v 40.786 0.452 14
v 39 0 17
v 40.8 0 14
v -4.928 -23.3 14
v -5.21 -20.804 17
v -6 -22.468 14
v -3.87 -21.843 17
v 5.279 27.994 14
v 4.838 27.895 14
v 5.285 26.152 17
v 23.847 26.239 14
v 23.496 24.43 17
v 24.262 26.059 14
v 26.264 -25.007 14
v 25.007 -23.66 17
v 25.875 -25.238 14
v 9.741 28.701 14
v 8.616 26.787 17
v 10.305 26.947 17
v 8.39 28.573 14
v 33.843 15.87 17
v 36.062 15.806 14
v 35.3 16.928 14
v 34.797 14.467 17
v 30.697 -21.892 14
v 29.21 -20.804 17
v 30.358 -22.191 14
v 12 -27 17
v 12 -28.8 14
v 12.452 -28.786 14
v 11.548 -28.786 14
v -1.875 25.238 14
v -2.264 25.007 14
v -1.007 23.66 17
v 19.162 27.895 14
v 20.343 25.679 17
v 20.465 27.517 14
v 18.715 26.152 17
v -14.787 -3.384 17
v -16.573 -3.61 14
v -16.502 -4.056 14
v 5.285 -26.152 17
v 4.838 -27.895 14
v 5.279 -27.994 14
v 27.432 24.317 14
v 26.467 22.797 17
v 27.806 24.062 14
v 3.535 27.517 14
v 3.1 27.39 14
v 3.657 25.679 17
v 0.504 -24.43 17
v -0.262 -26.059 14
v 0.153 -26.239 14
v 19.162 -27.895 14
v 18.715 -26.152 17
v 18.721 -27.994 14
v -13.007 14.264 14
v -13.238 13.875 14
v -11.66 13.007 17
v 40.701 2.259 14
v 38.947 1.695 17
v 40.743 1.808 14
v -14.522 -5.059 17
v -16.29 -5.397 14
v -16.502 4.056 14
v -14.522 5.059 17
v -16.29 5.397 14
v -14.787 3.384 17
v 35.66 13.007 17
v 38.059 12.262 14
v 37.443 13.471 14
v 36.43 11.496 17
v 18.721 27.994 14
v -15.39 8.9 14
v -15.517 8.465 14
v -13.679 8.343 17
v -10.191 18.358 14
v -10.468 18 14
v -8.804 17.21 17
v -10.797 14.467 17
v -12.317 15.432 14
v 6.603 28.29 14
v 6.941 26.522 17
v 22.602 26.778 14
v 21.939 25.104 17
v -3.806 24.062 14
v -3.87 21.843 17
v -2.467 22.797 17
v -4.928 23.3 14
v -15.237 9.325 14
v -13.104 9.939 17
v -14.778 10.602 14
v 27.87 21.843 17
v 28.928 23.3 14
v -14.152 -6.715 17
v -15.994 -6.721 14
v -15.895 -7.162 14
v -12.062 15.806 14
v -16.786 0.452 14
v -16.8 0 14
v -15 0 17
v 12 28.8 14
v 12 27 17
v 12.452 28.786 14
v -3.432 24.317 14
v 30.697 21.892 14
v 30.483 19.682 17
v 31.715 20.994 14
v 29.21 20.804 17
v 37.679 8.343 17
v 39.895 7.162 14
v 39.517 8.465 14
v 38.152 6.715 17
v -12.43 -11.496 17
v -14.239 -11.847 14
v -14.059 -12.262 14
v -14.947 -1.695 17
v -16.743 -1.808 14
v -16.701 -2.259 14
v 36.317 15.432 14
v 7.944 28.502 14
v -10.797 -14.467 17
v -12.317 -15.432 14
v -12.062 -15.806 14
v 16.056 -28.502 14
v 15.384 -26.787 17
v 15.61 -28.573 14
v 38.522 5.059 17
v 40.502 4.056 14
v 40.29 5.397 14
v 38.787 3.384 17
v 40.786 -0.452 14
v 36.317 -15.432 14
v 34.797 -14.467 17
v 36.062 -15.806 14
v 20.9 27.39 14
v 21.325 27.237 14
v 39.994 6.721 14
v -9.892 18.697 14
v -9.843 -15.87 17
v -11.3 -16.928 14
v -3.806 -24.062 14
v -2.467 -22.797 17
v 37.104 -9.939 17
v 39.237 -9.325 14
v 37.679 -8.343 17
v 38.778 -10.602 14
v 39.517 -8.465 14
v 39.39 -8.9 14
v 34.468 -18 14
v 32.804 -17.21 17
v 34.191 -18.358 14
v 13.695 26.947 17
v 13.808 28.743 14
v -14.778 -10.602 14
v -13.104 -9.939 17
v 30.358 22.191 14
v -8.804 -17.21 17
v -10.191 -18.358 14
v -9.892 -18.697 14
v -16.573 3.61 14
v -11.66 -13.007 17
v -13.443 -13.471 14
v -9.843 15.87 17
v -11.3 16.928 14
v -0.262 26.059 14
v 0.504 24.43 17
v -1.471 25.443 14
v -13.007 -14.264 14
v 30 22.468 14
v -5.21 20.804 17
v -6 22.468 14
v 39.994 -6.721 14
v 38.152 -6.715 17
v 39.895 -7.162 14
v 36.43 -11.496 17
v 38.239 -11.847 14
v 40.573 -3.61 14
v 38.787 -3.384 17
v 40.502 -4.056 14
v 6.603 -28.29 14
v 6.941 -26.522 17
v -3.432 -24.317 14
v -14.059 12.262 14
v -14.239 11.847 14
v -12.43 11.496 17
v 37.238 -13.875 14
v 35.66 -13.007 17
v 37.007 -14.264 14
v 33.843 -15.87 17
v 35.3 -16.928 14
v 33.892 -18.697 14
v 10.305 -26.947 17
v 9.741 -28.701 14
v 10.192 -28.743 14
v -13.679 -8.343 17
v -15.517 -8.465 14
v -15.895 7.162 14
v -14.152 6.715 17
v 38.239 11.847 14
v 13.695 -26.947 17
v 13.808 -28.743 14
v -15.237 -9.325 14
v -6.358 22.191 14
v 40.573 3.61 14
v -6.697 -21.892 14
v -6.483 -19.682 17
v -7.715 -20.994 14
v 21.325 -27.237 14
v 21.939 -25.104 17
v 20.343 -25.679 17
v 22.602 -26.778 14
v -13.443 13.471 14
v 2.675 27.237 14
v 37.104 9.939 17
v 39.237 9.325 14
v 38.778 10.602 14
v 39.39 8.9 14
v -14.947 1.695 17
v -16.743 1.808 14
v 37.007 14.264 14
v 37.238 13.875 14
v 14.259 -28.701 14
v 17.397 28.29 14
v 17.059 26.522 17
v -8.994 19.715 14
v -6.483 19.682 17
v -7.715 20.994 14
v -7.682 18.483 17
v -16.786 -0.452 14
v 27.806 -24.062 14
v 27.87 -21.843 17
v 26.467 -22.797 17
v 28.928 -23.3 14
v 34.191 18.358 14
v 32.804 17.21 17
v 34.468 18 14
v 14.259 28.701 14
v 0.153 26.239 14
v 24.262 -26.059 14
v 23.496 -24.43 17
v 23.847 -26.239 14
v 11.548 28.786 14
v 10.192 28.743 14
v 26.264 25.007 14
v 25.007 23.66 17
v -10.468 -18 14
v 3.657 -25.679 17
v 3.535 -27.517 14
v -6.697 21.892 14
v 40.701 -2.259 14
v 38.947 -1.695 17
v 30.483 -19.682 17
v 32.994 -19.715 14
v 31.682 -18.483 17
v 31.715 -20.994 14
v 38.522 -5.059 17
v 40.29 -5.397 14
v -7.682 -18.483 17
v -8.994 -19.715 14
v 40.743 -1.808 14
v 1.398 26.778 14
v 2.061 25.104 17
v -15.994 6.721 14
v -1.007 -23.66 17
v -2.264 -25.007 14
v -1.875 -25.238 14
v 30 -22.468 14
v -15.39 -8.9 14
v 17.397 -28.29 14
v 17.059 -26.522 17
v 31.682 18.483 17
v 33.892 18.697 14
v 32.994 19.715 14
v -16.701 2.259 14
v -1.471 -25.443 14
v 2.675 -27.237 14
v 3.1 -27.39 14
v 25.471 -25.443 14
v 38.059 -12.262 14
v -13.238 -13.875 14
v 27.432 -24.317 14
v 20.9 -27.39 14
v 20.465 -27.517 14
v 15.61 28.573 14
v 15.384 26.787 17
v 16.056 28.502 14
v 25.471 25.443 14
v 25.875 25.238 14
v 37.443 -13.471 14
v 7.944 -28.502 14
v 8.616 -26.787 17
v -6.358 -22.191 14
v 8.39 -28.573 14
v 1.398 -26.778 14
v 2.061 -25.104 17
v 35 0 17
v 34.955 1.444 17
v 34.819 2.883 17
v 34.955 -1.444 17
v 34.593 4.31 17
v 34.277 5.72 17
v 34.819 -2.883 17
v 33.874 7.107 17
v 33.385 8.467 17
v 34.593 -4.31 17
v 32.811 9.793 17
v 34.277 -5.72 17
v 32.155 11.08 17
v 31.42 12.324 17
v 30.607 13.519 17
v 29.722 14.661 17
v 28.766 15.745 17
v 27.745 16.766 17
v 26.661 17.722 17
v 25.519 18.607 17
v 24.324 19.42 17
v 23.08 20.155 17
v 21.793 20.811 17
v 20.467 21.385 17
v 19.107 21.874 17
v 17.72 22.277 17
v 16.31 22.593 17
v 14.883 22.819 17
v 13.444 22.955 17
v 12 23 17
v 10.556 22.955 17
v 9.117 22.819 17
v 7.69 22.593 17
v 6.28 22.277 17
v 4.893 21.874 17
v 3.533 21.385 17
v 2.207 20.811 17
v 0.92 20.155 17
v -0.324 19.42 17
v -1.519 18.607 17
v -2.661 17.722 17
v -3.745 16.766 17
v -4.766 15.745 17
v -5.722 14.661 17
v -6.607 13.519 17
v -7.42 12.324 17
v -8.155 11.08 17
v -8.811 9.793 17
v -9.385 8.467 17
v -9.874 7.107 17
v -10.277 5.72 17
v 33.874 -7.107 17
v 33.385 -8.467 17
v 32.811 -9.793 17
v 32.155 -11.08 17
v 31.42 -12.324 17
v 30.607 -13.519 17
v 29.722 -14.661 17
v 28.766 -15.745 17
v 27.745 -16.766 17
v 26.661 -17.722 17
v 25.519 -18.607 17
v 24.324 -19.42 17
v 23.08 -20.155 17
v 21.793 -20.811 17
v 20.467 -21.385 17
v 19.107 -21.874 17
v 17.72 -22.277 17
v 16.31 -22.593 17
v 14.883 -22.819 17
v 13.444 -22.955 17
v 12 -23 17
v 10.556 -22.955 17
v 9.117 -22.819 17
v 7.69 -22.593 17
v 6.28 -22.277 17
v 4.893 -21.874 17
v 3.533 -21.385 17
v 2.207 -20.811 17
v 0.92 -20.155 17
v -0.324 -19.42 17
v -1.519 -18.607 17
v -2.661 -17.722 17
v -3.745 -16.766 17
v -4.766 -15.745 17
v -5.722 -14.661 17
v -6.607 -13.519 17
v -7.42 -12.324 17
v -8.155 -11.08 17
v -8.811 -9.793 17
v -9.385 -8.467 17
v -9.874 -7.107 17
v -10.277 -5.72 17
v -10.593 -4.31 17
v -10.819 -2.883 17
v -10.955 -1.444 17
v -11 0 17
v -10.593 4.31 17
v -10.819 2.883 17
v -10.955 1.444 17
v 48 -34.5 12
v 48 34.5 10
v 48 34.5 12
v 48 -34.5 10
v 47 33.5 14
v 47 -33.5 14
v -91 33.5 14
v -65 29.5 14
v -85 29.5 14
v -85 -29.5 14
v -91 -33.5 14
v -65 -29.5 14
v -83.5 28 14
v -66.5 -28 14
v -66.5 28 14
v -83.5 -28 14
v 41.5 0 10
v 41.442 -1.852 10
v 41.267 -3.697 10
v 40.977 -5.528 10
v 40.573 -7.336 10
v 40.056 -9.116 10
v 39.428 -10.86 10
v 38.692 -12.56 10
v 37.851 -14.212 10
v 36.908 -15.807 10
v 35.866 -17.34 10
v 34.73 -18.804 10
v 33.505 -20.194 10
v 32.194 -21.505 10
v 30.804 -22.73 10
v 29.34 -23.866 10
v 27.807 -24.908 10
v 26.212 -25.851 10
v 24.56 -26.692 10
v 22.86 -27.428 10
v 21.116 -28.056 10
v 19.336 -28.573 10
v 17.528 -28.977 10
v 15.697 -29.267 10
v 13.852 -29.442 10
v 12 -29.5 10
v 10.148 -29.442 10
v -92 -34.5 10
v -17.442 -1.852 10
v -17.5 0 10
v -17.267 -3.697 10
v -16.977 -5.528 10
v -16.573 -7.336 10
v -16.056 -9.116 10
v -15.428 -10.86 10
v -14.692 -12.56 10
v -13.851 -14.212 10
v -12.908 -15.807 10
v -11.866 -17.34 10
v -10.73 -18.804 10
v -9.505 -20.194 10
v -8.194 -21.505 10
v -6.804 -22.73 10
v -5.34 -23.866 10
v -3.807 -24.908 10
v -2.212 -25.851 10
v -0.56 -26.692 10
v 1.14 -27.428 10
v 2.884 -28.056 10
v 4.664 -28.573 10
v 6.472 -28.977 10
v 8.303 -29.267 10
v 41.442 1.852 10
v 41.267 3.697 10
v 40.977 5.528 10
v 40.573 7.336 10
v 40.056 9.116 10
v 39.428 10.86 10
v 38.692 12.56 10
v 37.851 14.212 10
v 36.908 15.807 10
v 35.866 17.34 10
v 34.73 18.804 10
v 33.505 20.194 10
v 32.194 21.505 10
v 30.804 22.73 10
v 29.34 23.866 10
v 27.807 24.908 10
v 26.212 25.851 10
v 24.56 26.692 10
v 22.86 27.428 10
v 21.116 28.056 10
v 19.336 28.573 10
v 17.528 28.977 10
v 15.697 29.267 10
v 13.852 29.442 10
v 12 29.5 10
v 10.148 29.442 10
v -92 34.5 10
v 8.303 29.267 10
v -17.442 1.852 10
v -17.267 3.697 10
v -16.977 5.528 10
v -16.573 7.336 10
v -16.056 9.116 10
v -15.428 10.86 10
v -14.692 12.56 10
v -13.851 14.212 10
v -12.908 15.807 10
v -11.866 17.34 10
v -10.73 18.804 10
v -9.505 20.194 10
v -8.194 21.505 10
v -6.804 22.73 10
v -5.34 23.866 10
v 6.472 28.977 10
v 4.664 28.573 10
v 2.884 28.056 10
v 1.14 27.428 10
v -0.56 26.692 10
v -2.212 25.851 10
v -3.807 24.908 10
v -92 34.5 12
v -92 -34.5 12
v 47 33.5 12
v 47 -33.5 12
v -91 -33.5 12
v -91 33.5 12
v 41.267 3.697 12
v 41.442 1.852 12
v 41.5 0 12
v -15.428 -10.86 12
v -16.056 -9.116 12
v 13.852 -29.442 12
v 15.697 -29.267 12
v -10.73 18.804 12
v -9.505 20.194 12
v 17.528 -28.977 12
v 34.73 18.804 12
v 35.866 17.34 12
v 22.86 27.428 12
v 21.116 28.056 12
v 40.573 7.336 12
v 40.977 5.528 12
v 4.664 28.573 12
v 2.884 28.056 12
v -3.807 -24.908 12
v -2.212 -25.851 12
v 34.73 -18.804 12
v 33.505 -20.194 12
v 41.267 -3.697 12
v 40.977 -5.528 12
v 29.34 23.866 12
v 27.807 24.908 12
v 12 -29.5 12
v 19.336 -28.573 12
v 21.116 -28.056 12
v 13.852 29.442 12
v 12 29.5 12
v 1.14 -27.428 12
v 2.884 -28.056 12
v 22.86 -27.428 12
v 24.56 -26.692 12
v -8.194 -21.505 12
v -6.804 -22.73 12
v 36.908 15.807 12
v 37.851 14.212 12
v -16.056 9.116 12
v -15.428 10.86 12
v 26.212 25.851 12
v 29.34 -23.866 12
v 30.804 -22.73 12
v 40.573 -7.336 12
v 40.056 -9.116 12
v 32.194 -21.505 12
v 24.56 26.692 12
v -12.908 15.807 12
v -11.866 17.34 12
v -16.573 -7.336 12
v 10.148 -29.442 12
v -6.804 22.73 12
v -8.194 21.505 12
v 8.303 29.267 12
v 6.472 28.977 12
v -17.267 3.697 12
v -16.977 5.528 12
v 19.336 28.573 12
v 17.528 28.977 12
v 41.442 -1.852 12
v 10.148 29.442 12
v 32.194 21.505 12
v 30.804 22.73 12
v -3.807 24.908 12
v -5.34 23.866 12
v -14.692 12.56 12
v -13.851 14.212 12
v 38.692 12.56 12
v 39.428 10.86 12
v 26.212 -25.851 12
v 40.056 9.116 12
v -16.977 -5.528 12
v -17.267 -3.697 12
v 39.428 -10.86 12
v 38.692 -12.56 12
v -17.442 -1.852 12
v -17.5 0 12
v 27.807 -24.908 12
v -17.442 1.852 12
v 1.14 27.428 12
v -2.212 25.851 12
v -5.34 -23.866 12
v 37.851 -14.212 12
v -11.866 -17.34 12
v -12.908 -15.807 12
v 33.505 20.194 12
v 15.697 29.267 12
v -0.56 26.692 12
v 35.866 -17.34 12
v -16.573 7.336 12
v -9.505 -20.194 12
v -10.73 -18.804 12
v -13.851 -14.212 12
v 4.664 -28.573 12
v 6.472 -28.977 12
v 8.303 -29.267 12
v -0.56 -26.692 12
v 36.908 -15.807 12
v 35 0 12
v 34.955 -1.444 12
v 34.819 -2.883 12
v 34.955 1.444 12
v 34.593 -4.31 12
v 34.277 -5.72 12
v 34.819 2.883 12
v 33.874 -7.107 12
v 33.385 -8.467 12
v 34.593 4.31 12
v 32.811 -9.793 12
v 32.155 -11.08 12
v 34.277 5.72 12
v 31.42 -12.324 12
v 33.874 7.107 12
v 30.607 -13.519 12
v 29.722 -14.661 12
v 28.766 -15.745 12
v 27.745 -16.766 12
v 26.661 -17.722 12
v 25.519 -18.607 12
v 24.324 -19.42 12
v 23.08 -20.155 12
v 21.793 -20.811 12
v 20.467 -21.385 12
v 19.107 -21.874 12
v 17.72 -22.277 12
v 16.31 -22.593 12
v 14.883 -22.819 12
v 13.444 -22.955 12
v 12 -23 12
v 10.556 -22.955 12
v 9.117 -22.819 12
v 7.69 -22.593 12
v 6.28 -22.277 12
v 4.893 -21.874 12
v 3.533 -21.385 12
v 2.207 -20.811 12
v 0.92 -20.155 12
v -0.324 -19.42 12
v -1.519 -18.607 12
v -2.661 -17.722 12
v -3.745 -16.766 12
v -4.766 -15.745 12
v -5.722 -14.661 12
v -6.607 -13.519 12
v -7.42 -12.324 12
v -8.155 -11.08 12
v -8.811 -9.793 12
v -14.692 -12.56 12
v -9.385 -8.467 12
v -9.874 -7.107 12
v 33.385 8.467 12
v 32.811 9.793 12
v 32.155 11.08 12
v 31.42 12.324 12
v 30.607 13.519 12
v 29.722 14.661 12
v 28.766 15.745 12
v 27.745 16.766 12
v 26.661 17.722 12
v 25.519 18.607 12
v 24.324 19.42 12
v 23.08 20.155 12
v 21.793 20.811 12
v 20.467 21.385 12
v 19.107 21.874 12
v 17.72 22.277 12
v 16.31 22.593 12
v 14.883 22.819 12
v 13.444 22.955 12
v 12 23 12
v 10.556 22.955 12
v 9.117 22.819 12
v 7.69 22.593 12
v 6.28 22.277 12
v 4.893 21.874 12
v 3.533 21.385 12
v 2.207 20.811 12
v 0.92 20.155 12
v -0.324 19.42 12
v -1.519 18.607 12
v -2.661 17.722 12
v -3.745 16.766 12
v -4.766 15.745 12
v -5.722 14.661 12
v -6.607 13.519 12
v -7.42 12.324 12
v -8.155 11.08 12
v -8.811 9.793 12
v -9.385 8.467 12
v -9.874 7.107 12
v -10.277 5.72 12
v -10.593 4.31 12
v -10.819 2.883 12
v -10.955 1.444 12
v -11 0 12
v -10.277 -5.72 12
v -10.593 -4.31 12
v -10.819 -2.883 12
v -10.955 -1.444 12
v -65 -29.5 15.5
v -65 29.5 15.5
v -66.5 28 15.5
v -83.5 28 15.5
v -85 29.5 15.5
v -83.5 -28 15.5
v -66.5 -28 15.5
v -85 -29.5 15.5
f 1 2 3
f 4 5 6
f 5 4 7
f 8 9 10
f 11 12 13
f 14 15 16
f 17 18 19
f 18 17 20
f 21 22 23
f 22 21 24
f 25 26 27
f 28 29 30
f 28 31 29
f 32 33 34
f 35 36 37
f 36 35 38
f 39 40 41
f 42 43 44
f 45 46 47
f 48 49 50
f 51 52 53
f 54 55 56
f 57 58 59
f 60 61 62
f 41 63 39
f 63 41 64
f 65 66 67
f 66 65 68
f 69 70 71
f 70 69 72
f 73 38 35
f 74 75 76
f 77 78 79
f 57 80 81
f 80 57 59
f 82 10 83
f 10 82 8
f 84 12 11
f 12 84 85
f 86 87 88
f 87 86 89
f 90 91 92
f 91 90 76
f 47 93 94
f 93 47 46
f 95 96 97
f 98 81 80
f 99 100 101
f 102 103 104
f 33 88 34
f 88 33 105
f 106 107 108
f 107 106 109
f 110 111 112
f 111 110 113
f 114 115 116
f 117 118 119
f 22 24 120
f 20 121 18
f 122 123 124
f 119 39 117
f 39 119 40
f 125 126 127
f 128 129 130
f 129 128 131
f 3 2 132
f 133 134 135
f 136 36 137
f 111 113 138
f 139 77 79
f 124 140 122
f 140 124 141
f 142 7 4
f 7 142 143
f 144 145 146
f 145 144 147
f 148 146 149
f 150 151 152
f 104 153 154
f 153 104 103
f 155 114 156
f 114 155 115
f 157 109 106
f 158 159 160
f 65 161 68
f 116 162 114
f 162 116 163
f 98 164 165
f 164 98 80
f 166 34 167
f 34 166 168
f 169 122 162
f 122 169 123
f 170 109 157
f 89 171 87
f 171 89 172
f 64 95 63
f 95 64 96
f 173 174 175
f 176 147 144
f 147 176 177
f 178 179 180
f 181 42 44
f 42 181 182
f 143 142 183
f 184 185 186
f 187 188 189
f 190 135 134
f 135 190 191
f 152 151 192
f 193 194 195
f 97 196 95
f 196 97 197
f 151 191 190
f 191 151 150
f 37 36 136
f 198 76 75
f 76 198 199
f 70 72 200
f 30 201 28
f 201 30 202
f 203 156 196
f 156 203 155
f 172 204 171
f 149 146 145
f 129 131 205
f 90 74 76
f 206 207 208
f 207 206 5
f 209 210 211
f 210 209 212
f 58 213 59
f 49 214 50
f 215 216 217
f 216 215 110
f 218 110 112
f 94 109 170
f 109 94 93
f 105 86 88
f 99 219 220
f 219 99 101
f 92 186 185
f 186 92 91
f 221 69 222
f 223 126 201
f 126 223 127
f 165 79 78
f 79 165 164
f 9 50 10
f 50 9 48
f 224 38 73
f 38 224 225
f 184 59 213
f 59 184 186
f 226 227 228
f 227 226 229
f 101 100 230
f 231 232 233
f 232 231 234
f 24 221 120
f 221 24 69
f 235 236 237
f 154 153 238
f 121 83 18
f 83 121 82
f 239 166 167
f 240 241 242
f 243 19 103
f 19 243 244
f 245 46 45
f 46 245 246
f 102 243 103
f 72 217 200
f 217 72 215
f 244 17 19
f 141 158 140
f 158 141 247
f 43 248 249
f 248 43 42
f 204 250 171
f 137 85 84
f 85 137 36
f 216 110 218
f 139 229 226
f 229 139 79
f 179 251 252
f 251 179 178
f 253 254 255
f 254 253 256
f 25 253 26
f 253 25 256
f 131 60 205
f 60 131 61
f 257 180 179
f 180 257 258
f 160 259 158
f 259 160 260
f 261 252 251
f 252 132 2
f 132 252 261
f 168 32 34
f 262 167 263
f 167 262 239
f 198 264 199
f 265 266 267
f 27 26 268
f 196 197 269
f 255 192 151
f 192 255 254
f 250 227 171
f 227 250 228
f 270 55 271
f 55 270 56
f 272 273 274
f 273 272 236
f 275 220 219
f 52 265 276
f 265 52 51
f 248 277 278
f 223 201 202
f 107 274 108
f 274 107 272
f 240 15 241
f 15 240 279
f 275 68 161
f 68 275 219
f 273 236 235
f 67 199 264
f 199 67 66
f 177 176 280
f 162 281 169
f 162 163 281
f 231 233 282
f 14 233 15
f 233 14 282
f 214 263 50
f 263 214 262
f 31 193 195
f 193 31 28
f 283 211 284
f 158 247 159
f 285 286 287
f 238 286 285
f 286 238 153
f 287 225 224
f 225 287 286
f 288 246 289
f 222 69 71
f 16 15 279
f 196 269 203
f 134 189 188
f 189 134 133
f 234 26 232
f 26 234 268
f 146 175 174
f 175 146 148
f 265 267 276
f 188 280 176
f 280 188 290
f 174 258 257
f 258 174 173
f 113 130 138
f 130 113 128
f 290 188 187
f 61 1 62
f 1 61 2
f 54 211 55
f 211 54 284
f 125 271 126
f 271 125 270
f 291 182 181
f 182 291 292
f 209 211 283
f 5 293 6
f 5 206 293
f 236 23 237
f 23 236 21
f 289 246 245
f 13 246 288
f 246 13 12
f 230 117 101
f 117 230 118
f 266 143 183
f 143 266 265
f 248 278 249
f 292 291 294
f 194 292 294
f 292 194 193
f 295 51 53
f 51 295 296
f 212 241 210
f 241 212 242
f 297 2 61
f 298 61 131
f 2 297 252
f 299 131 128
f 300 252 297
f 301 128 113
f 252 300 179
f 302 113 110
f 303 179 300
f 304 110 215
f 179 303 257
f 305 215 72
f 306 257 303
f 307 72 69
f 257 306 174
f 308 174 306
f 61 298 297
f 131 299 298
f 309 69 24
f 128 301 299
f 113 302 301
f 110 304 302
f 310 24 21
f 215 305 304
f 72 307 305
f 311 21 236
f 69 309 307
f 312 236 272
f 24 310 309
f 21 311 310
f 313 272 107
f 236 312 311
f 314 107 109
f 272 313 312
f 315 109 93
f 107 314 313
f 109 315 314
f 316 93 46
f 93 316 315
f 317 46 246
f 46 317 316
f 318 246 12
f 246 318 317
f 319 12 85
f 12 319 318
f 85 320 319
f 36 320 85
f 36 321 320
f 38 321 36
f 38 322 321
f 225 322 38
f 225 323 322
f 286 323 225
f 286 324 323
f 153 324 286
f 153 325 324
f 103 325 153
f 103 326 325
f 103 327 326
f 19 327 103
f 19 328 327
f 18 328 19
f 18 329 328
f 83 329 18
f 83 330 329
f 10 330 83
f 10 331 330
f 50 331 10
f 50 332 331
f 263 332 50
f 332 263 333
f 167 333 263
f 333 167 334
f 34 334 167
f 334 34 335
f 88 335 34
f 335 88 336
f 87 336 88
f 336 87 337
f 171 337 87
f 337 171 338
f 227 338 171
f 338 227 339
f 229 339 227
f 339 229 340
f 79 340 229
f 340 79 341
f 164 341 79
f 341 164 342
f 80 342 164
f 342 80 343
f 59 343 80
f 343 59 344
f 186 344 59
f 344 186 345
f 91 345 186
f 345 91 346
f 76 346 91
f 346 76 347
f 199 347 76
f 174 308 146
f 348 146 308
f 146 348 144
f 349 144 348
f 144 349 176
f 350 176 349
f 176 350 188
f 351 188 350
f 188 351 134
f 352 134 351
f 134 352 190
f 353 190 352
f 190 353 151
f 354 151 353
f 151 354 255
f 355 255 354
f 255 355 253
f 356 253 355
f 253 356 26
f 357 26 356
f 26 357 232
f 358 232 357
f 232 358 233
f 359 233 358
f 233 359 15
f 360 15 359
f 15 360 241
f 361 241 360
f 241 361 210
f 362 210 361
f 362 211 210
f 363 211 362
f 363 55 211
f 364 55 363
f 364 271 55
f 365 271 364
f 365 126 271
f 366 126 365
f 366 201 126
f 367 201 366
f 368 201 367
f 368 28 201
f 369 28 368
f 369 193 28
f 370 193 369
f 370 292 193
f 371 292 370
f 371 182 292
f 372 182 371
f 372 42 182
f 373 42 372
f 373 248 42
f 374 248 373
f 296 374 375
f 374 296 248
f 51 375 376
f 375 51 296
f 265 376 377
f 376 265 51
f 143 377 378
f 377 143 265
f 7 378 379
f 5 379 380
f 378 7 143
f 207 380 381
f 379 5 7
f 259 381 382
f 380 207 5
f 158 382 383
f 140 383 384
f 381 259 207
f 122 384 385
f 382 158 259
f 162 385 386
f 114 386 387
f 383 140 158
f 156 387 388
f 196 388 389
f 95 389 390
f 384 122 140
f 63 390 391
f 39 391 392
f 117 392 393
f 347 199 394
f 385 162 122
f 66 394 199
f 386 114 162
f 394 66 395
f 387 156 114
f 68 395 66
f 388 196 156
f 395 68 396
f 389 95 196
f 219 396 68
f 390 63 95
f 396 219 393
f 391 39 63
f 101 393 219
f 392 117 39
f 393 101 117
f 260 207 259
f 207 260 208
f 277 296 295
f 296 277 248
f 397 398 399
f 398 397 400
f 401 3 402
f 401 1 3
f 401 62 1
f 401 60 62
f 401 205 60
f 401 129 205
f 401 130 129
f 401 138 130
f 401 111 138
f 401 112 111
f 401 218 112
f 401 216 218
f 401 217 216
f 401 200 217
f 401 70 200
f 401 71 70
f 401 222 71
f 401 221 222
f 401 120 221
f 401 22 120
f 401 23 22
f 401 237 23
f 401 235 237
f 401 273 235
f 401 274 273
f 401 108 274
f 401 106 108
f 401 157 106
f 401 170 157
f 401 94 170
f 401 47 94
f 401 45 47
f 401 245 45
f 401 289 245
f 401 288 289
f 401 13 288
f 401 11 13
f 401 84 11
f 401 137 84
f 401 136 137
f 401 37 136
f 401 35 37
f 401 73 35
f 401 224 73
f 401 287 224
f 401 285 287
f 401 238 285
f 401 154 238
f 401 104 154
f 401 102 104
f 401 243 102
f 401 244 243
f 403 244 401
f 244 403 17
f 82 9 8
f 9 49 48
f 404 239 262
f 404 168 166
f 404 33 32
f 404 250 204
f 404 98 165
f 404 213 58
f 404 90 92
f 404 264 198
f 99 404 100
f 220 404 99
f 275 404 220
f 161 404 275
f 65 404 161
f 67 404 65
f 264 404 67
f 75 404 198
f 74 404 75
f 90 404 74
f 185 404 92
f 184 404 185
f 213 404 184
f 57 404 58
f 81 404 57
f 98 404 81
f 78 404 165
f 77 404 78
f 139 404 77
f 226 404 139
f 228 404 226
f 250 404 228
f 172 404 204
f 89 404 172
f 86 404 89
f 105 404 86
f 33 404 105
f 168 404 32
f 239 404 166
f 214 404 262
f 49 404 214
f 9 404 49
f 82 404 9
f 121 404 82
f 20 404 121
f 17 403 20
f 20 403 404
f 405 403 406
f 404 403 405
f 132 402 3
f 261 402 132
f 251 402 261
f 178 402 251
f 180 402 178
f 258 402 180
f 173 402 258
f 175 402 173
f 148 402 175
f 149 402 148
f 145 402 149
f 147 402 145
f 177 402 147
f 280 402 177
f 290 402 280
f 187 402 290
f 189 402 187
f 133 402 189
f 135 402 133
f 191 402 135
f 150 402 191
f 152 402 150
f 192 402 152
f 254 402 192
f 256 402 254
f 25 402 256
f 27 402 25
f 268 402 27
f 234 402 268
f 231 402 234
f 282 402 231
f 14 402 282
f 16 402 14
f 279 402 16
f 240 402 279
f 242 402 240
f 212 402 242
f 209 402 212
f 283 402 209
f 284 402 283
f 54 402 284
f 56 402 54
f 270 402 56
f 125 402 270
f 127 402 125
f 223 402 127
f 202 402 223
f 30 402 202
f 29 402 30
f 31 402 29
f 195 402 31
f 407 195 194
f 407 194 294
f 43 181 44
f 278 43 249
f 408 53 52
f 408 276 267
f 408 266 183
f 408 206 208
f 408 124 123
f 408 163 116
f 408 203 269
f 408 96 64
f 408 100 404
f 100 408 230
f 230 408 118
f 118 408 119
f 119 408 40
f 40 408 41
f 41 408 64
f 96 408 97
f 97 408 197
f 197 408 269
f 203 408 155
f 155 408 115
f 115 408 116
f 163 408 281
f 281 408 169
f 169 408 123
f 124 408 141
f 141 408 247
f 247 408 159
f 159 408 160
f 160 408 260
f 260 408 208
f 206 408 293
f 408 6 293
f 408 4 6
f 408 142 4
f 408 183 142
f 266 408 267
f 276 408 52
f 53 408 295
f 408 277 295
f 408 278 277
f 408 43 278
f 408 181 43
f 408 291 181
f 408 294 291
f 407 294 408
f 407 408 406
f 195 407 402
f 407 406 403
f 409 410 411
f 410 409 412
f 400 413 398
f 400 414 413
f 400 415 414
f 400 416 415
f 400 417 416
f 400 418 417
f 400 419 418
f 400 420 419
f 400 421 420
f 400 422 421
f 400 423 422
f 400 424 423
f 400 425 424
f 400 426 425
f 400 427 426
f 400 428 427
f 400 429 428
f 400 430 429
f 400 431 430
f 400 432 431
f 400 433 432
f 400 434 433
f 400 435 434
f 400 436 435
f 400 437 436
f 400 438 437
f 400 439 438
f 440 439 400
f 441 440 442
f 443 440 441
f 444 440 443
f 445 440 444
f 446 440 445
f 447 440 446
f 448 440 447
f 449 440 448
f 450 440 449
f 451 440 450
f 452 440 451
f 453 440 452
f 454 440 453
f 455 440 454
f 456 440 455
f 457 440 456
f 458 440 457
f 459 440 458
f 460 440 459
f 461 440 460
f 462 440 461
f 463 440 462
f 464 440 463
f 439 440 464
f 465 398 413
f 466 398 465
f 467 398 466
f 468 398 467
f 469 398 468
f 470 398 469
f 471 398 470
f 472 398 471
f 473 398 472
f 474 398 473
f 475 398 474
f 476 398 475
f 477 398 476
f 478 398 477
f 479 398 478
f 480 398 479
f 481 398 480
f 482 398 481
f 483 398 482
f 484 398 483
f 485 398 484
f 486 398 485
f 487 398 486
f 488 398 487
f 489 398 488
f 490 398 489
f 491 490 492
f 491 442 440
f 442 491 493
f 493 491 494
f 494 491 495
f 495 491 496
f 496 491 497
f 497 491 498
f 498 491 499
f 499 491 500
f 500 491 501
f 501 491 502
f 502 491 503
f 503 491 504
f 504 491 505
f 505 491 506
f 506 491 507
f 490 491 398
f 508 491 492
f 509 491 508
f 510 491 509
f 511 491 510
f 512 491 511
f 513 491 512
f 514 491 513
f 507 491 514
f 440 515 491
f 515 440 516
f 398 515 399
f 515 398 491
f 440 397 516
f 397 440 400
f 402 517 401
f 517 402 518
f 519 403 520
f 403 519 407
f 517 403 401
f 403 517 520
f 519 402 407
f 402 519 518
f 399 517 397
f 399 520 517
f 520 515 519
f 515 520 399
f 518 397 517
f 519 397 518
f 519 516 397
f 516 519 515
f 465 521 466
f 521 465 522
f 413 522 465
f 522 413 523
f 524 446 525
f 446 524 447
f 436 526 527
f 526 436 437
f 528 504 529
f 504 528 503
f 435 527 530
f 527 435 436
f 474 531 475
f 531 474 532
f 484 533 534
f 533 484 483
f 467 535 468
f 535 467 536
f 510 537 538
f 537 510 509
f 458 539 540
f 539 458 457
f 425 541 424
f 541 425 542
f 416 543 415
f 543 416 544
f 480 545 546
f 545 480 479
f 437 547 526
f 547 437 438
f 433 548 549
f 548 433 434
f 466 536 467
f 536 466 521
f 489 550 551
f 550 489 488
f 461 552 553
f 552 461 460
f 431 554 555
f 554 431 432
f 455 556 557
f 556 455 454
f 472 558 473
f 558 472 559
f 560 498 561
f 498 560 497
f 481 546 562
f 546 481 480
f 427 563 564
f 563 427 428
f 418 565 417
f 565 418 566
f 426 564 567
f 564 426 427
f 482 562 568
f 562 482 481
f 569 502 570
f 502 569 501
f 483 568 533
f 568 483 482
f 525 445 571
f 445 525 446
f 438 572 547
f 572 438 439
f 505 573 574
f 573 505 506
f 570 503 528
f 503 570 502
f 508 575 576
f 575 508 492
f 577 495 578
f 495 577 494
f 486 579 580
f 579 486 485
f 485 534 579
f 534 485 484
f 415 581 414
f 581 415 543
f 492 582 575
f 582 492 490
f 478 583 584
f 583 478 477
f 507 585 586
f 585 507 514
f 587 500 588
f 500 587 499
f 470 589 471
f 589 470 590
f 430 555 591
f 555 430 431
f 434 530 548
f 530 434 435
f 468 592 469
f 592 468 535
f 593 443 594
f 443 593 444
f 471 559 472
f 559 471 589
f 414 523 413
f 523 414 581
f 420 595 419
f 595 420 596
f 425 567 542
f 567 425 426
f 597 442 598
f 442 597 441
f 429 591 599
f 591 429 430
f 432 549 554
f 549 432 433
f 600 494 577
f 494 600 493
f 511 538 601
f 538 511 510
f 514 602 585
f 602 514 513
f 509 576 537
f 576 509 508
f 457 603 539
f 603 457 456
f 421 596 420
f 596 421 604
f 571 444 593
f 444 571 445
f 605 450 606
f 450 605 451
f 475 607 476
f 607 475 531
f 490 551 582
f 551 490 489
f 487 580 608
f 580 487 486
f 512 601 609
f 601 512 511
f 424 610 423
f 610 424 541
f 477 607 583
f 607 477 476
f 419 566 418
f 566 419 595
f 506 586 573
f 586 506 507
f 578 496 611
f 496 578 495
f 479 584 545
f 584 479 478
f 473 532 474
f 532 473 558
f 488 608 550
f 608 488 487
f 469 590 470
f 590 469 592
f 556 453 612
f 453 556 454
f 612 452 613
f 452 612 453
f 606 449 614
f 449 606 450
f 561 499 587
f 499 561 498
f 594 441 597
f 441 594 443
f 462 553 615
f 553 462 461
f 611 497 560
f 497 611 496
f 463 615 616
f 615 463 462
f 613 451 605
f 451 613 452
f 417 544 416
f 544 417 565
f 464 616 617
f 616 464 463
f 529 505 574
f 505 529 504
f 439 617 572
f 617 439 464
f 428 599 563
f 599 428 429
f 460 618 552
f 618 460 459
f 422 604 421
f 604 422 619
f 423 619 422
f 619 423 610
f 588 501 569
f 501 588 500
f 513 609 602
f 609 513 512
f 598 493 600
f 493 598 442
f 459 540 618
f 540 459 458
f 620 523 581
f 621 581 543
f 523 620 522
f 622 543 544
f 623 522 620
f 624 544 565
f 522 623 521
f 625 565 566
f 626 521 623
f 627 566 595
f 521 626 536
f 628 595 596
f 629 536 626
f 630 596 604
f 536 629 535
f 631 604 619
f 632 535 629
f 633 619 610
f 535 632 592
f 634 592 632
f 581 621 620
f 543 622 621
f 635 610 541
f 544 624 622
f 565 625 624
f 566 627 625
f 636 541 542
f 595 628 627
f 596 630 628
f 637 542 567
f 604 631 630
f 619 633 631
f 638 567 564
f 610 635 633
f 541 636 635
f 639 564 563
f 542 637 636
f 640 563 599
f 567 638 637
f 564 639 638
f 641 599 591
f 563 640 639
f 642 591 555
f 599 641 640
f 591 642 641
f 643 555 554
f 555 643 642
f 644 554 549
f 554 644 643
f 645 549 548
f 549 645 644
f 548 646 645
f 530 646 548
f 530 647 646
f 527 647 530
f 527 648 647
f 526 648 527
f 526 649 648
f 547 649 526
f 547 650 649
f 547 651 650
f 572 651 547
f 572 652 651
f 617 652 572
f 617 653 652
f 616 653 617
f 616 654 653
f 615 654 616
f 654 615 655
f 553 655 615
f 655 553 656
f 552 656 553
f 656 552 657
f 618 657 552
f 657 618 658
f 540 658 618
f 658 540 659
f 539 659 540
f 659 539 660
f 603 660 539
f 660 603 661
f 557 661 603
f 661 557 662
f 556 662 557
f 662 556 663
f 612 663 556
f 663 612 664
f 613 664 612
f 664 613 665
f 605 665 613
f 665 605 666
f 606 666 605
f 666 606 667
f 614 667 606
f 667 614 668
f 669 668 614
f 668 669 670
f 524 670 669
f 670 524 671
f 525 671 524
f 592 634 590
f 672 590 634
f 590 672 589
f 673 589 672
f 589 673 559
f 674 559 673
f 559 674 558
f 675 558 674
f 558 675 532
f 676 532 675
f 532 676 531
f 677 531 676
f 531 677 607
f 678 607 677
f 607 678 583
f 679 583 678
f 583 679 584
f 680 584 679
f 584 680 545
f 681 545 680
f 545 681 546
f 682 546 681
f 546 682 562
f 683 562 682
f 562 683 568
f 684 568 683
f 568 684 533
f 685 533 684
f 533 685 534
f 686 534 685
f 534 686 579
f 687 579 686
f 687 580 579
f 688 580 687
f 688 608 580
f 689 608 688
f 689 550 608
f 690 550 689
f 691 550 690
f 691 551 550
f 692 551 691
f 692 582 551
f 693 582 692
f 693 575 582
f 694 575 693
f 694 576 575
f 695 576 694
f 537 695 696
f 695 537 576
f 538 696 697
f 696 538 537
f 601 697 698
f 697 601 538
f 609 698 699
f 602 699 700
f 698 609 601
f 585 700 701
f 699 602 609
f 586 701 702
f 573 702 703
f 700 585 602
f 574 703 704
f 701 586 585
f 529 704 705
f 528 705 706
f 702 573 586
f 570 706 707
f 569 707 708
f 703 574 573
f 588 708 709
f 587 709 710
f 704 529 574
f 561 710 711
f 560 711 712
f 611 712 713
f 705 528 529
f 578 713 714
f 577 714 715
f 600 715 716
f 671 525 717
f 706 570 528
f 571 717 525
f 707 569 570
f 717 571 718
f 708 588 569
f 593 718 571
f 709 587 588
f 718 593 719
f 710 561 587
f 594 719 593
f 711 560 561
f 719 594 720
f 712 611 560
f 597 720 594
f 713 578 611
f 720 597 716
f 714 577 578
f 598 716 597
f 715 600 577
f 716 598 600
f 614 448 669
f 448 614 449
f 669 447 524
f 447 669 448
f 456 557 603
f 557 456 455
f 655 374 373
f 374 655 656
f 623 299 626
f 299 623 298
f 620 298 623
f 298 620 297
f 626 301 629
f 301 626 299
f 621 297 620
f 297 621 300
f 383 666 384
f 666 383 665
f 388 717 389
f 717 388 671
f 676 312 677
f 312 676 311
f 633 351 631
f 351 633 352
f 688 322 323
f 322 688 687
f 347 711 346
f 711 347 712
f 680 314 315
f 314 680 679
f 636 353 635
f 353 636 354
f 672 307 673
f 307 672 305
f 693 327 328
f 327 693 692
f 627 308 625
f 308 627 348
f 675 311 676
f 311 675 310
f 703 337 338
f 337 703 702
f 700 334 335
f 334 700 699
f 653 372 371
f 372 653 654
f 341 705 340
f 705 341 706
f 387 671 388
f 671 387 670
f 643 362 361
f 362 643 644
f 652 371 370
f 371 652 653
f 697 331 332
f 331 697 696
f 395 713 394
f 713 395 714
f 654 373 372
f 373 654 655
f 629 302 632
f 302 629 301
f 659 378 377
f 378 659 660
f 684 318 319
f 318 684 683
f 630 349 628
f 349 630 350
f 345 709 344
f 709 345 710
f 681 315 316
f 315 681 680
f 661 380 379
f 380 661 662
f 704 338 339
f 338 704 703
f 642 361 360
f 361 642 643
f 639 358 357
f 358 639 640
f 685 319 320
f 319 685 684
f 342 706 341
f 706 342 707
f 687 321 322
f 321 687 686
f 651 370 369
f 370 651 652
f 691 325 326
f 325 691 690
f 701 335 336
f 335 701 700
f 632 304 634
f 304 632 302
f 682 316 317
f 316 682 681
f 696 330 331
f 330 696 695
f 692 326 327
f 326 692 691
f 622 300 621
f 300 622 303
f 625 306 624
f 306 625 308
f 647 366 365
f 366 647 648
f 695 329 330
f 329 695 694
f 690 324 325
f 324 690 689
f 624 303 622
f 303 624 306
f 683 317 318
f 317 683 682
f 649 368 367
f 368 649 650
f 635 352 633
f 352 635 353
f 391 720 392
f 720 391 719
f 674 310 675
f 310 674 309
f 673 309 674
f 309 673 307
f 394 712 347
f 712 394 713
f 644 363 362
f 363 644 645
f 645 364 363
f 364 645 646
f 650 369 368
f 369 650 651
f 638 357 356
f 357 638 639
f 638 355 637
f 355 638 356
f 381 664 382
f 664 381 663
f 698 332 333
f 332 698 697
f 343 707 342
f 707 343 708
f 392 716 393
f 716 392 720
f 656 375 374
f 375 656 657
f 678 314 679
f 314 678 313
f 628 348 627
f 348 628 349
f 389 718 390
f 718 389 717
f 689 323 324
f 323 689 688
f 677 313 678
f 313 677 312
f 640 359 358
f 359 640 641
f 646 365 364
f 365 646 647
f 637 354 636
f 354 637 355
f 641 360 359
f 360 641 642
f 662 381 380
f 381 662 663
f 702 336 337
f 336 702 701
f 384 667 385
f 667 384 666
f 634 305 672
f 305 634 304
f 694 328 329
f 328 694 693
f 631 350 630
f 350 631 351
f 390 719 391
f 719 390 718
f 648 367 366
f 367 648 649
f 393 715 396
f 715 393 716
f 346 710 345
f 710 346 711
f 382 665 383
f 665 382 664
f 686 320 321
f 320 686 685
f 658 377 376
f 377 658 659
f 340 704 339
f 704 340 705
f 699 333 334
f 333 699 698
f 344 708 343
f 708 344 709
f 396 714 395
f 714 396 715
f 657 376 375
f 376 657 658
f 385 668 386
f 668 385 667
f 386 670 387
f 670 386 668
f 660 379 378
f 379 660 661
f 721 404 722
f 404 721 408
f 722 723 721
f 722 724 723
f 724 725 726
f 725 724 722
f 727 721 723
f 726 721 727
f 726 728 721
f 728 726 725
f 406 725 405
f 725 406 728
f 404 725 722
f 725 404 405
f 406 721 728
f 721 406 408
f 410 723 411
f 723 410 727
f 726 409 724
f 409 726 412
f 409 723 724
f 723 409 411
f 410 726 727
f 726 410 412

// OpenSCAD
$fn = 100;

// dimensions
radius = 46 / 2;
thickness = 3;
yi_height = 16;
yi_base_thickness = 12;
yi_base_radius = 59 / 2;

// hal height
border_height = 5;
height = yi_base_thickness + border_height; // inset size
length = 190;
width = 75;
border = 4;
speaker_height = 40;
camera_height = length - speaker_height - border * 3;
hole_spacing = 3;
panel_thickness = 2;
panel_inset = 1;

module camera() {
    translate([0, 0, yi_base_thickness / 2]) {
        cylinder(yi_base_thickness, yi_base_radius, yi_base_radius, true);
        translate([0, 0, (yi_height + yi_base_thickness) / 2]) cylinder(yi_height, radius, radius, true);
        
    }
    translate([40, 0, 4]) {
        cube([24, 12, 8], true);
        translate([110, 0, -4]) {
            rotate([0, 90, 0]) {
                translate([-3, 0, 0]) {
                    cylinder(200, 3, 3, true);
                }
                cube([6, 6, 200], true);
            }
        }
    }
}

module camera_large() {
    translate([0, 0, yi_base_thickness / 2]) {
        cylinder(yi_base_thickness, yi_base_radius, yi_base_radius, true);
        translate([0, 0, (yi_height + yi_base_thickness) / 2]) cylinder(yi_height, radius + 2, radius + 2, true);
        
    }
    translate([40, 0, 4]) {
        cube([24, 12, 8], true);
        translate([110, 0, -4]) {
            rotate([0, 90, 0]) {
                translate([-3, 0, 0]) {
                    cylinder(200, 3, 3, true);
                }
                cube([6, 6, 200], true);
            }
        }
    }
}

module case() {
    difference() {
        translate([0, 0, height / 2]) cube([length, width, height], true);

        translate([(length + speaker_height) / 2 - border - speaker_height, 0, height - border_height / 4 ]) {
            cube([speaker_height, width - 2 * border, border_height], true);
        }
            translate([-(length / 2) + camera_height / 2 + border, 0, height - border_height / 4]) cube([camera_height, width - 2 * border, border_height], true);
    }
    translate([15, 0, 1]) cylinder(15, radius + 13, radius + 4);

    translate([-75, 0, height -7]) {
        difference() {
        cube([20, width - border * 4, 10], true);
        cube([17, width - border * 4 - 2, 10], true);
        
            
        }
    }
}

module frame() {
    difference() {
        translate([0, 0, height / 2]) cube([length, width, height], true);

        // speaker cutout
        translate([(length + speaker_height) / 2 - border - speaker_height, 0, height - border_height / 4 ]) {
            cube([speaker_height, width - 2 * border, border_height * 20], true);
        }
        
        // speaker insert
        translate([(length + speaker_height) / 2 - border - speaker_height, 0, height / 2 - border_height / 2]) {
            cube([speaker_height + 2, width - 2 * border + 2, height], true);
        }
        
        // main panel cutout
        translate([-(length / 2) + camera_height / 2 + border, 0, height - border_height / 4]) cube([camera_height, width - 2 * border, border_height * 20], true);
        
        // main panel insert
        translate([-(length / 2) + camera_height / 2 + border, 0, height / 2 - border_height]) {
            cube([camera_height + 2, width - 2 * border + 2, height], true);
        }
        
        translate([15, 0, 0]) camera();
    }
    
    
    
    // support nubs
    /*
    translate([-25, width / 2 - 3, height - 1 - border_height - 2]) cube([2, 2, 2], true);
    translate([-25, -(width / 2 - 3), height - 1 - border_height - 2]) cube([2, 2, 2], true);
    translate([-length / 2 + 3, 0, height - 1 - border_height - 2]) cube([2, 2, 2], true);
    translate([48, 0, height - 1 - border_height - 2]) cube([2, 2, 2], true);
    translate([70, width / 2 - 3, height - 5.5]) cube([2, 2, 2], true);
    translate([70, -(width / 2 - 3), height - 5.5]) cube([2, 2, 2], true);
    */
    
    // frame
    translate([-length / 2 + 10, 0, 1]) {
        difference() {
            cube([16, 10, 2], true);
            hull() {
                translate([2, 0, 0]) cylinder(10, 1.5, 1.5, true);
                translate([-3, 0, 0]) cylinder(10, 1.5, 1.5, true);
            }
            translate([2, 0, 0]) cylinder(10, 3.5, 3.5, true);
        }
    }
    
    
}


module grill() {
    difference() {
        cube([speaker_height + 2, width - 2 * border + 2, 2]);

        translate([hole_spacing, hole_spacing, 0]) {
            for (x = [0: floor((width - border * 2) / hole_spacing) - 1]) {
                for (y = [0: floor(speaker_height / hole_spacing) - 1]) {
                    translate([y * hole_spacing, x * hole_spacing, 0]) {
                        cylinder(10, 1, 1);
                    }
                }
            }
        } 
    }
}








difference() {
    //case();
    //translate([15, 0, 0]) camera();
}

module main_black() {
    difference() {
        union() {
            color("blue", 50) translate([-22, 0, height - border_height]) cube([camera_height + 2, width - 2 * border + 2, 4], true);
            
             translate([12, 0, 2]) {
                 difference() {
                    cylinder(15, radius + 13, radius + 4);
                    cube([100, 100, 18], true);
                 }
                 
             }
            
        }
        
        frame();                                            
            

        color("red") translate([12, 0, 0]) camera();
    }       

    color("green") {
        translate([-75, 0, height - 2.5]) {
            difference() {
            cube([20, width - border * 4, 2], true);
            cube([17, width - border * 4 - 3, 11], true);       
            }
        }
    }
}

module ring() {
    difference() {
        union() {
            difference() {
                translate([15, 0, 1]) cylinder(15, radius + 13, radius + 4);
                translate([0, 0, 6]) cube([200, 200, 12], true);
                
            }
            translate([15, 0, 11]) cylinder(2, radius + 2, radius + 2, true);
        }
        translate([15, 0, 11]) cylinder(20, radius, radius, true);
    }
}


main_black();
//frame();
//grill();
